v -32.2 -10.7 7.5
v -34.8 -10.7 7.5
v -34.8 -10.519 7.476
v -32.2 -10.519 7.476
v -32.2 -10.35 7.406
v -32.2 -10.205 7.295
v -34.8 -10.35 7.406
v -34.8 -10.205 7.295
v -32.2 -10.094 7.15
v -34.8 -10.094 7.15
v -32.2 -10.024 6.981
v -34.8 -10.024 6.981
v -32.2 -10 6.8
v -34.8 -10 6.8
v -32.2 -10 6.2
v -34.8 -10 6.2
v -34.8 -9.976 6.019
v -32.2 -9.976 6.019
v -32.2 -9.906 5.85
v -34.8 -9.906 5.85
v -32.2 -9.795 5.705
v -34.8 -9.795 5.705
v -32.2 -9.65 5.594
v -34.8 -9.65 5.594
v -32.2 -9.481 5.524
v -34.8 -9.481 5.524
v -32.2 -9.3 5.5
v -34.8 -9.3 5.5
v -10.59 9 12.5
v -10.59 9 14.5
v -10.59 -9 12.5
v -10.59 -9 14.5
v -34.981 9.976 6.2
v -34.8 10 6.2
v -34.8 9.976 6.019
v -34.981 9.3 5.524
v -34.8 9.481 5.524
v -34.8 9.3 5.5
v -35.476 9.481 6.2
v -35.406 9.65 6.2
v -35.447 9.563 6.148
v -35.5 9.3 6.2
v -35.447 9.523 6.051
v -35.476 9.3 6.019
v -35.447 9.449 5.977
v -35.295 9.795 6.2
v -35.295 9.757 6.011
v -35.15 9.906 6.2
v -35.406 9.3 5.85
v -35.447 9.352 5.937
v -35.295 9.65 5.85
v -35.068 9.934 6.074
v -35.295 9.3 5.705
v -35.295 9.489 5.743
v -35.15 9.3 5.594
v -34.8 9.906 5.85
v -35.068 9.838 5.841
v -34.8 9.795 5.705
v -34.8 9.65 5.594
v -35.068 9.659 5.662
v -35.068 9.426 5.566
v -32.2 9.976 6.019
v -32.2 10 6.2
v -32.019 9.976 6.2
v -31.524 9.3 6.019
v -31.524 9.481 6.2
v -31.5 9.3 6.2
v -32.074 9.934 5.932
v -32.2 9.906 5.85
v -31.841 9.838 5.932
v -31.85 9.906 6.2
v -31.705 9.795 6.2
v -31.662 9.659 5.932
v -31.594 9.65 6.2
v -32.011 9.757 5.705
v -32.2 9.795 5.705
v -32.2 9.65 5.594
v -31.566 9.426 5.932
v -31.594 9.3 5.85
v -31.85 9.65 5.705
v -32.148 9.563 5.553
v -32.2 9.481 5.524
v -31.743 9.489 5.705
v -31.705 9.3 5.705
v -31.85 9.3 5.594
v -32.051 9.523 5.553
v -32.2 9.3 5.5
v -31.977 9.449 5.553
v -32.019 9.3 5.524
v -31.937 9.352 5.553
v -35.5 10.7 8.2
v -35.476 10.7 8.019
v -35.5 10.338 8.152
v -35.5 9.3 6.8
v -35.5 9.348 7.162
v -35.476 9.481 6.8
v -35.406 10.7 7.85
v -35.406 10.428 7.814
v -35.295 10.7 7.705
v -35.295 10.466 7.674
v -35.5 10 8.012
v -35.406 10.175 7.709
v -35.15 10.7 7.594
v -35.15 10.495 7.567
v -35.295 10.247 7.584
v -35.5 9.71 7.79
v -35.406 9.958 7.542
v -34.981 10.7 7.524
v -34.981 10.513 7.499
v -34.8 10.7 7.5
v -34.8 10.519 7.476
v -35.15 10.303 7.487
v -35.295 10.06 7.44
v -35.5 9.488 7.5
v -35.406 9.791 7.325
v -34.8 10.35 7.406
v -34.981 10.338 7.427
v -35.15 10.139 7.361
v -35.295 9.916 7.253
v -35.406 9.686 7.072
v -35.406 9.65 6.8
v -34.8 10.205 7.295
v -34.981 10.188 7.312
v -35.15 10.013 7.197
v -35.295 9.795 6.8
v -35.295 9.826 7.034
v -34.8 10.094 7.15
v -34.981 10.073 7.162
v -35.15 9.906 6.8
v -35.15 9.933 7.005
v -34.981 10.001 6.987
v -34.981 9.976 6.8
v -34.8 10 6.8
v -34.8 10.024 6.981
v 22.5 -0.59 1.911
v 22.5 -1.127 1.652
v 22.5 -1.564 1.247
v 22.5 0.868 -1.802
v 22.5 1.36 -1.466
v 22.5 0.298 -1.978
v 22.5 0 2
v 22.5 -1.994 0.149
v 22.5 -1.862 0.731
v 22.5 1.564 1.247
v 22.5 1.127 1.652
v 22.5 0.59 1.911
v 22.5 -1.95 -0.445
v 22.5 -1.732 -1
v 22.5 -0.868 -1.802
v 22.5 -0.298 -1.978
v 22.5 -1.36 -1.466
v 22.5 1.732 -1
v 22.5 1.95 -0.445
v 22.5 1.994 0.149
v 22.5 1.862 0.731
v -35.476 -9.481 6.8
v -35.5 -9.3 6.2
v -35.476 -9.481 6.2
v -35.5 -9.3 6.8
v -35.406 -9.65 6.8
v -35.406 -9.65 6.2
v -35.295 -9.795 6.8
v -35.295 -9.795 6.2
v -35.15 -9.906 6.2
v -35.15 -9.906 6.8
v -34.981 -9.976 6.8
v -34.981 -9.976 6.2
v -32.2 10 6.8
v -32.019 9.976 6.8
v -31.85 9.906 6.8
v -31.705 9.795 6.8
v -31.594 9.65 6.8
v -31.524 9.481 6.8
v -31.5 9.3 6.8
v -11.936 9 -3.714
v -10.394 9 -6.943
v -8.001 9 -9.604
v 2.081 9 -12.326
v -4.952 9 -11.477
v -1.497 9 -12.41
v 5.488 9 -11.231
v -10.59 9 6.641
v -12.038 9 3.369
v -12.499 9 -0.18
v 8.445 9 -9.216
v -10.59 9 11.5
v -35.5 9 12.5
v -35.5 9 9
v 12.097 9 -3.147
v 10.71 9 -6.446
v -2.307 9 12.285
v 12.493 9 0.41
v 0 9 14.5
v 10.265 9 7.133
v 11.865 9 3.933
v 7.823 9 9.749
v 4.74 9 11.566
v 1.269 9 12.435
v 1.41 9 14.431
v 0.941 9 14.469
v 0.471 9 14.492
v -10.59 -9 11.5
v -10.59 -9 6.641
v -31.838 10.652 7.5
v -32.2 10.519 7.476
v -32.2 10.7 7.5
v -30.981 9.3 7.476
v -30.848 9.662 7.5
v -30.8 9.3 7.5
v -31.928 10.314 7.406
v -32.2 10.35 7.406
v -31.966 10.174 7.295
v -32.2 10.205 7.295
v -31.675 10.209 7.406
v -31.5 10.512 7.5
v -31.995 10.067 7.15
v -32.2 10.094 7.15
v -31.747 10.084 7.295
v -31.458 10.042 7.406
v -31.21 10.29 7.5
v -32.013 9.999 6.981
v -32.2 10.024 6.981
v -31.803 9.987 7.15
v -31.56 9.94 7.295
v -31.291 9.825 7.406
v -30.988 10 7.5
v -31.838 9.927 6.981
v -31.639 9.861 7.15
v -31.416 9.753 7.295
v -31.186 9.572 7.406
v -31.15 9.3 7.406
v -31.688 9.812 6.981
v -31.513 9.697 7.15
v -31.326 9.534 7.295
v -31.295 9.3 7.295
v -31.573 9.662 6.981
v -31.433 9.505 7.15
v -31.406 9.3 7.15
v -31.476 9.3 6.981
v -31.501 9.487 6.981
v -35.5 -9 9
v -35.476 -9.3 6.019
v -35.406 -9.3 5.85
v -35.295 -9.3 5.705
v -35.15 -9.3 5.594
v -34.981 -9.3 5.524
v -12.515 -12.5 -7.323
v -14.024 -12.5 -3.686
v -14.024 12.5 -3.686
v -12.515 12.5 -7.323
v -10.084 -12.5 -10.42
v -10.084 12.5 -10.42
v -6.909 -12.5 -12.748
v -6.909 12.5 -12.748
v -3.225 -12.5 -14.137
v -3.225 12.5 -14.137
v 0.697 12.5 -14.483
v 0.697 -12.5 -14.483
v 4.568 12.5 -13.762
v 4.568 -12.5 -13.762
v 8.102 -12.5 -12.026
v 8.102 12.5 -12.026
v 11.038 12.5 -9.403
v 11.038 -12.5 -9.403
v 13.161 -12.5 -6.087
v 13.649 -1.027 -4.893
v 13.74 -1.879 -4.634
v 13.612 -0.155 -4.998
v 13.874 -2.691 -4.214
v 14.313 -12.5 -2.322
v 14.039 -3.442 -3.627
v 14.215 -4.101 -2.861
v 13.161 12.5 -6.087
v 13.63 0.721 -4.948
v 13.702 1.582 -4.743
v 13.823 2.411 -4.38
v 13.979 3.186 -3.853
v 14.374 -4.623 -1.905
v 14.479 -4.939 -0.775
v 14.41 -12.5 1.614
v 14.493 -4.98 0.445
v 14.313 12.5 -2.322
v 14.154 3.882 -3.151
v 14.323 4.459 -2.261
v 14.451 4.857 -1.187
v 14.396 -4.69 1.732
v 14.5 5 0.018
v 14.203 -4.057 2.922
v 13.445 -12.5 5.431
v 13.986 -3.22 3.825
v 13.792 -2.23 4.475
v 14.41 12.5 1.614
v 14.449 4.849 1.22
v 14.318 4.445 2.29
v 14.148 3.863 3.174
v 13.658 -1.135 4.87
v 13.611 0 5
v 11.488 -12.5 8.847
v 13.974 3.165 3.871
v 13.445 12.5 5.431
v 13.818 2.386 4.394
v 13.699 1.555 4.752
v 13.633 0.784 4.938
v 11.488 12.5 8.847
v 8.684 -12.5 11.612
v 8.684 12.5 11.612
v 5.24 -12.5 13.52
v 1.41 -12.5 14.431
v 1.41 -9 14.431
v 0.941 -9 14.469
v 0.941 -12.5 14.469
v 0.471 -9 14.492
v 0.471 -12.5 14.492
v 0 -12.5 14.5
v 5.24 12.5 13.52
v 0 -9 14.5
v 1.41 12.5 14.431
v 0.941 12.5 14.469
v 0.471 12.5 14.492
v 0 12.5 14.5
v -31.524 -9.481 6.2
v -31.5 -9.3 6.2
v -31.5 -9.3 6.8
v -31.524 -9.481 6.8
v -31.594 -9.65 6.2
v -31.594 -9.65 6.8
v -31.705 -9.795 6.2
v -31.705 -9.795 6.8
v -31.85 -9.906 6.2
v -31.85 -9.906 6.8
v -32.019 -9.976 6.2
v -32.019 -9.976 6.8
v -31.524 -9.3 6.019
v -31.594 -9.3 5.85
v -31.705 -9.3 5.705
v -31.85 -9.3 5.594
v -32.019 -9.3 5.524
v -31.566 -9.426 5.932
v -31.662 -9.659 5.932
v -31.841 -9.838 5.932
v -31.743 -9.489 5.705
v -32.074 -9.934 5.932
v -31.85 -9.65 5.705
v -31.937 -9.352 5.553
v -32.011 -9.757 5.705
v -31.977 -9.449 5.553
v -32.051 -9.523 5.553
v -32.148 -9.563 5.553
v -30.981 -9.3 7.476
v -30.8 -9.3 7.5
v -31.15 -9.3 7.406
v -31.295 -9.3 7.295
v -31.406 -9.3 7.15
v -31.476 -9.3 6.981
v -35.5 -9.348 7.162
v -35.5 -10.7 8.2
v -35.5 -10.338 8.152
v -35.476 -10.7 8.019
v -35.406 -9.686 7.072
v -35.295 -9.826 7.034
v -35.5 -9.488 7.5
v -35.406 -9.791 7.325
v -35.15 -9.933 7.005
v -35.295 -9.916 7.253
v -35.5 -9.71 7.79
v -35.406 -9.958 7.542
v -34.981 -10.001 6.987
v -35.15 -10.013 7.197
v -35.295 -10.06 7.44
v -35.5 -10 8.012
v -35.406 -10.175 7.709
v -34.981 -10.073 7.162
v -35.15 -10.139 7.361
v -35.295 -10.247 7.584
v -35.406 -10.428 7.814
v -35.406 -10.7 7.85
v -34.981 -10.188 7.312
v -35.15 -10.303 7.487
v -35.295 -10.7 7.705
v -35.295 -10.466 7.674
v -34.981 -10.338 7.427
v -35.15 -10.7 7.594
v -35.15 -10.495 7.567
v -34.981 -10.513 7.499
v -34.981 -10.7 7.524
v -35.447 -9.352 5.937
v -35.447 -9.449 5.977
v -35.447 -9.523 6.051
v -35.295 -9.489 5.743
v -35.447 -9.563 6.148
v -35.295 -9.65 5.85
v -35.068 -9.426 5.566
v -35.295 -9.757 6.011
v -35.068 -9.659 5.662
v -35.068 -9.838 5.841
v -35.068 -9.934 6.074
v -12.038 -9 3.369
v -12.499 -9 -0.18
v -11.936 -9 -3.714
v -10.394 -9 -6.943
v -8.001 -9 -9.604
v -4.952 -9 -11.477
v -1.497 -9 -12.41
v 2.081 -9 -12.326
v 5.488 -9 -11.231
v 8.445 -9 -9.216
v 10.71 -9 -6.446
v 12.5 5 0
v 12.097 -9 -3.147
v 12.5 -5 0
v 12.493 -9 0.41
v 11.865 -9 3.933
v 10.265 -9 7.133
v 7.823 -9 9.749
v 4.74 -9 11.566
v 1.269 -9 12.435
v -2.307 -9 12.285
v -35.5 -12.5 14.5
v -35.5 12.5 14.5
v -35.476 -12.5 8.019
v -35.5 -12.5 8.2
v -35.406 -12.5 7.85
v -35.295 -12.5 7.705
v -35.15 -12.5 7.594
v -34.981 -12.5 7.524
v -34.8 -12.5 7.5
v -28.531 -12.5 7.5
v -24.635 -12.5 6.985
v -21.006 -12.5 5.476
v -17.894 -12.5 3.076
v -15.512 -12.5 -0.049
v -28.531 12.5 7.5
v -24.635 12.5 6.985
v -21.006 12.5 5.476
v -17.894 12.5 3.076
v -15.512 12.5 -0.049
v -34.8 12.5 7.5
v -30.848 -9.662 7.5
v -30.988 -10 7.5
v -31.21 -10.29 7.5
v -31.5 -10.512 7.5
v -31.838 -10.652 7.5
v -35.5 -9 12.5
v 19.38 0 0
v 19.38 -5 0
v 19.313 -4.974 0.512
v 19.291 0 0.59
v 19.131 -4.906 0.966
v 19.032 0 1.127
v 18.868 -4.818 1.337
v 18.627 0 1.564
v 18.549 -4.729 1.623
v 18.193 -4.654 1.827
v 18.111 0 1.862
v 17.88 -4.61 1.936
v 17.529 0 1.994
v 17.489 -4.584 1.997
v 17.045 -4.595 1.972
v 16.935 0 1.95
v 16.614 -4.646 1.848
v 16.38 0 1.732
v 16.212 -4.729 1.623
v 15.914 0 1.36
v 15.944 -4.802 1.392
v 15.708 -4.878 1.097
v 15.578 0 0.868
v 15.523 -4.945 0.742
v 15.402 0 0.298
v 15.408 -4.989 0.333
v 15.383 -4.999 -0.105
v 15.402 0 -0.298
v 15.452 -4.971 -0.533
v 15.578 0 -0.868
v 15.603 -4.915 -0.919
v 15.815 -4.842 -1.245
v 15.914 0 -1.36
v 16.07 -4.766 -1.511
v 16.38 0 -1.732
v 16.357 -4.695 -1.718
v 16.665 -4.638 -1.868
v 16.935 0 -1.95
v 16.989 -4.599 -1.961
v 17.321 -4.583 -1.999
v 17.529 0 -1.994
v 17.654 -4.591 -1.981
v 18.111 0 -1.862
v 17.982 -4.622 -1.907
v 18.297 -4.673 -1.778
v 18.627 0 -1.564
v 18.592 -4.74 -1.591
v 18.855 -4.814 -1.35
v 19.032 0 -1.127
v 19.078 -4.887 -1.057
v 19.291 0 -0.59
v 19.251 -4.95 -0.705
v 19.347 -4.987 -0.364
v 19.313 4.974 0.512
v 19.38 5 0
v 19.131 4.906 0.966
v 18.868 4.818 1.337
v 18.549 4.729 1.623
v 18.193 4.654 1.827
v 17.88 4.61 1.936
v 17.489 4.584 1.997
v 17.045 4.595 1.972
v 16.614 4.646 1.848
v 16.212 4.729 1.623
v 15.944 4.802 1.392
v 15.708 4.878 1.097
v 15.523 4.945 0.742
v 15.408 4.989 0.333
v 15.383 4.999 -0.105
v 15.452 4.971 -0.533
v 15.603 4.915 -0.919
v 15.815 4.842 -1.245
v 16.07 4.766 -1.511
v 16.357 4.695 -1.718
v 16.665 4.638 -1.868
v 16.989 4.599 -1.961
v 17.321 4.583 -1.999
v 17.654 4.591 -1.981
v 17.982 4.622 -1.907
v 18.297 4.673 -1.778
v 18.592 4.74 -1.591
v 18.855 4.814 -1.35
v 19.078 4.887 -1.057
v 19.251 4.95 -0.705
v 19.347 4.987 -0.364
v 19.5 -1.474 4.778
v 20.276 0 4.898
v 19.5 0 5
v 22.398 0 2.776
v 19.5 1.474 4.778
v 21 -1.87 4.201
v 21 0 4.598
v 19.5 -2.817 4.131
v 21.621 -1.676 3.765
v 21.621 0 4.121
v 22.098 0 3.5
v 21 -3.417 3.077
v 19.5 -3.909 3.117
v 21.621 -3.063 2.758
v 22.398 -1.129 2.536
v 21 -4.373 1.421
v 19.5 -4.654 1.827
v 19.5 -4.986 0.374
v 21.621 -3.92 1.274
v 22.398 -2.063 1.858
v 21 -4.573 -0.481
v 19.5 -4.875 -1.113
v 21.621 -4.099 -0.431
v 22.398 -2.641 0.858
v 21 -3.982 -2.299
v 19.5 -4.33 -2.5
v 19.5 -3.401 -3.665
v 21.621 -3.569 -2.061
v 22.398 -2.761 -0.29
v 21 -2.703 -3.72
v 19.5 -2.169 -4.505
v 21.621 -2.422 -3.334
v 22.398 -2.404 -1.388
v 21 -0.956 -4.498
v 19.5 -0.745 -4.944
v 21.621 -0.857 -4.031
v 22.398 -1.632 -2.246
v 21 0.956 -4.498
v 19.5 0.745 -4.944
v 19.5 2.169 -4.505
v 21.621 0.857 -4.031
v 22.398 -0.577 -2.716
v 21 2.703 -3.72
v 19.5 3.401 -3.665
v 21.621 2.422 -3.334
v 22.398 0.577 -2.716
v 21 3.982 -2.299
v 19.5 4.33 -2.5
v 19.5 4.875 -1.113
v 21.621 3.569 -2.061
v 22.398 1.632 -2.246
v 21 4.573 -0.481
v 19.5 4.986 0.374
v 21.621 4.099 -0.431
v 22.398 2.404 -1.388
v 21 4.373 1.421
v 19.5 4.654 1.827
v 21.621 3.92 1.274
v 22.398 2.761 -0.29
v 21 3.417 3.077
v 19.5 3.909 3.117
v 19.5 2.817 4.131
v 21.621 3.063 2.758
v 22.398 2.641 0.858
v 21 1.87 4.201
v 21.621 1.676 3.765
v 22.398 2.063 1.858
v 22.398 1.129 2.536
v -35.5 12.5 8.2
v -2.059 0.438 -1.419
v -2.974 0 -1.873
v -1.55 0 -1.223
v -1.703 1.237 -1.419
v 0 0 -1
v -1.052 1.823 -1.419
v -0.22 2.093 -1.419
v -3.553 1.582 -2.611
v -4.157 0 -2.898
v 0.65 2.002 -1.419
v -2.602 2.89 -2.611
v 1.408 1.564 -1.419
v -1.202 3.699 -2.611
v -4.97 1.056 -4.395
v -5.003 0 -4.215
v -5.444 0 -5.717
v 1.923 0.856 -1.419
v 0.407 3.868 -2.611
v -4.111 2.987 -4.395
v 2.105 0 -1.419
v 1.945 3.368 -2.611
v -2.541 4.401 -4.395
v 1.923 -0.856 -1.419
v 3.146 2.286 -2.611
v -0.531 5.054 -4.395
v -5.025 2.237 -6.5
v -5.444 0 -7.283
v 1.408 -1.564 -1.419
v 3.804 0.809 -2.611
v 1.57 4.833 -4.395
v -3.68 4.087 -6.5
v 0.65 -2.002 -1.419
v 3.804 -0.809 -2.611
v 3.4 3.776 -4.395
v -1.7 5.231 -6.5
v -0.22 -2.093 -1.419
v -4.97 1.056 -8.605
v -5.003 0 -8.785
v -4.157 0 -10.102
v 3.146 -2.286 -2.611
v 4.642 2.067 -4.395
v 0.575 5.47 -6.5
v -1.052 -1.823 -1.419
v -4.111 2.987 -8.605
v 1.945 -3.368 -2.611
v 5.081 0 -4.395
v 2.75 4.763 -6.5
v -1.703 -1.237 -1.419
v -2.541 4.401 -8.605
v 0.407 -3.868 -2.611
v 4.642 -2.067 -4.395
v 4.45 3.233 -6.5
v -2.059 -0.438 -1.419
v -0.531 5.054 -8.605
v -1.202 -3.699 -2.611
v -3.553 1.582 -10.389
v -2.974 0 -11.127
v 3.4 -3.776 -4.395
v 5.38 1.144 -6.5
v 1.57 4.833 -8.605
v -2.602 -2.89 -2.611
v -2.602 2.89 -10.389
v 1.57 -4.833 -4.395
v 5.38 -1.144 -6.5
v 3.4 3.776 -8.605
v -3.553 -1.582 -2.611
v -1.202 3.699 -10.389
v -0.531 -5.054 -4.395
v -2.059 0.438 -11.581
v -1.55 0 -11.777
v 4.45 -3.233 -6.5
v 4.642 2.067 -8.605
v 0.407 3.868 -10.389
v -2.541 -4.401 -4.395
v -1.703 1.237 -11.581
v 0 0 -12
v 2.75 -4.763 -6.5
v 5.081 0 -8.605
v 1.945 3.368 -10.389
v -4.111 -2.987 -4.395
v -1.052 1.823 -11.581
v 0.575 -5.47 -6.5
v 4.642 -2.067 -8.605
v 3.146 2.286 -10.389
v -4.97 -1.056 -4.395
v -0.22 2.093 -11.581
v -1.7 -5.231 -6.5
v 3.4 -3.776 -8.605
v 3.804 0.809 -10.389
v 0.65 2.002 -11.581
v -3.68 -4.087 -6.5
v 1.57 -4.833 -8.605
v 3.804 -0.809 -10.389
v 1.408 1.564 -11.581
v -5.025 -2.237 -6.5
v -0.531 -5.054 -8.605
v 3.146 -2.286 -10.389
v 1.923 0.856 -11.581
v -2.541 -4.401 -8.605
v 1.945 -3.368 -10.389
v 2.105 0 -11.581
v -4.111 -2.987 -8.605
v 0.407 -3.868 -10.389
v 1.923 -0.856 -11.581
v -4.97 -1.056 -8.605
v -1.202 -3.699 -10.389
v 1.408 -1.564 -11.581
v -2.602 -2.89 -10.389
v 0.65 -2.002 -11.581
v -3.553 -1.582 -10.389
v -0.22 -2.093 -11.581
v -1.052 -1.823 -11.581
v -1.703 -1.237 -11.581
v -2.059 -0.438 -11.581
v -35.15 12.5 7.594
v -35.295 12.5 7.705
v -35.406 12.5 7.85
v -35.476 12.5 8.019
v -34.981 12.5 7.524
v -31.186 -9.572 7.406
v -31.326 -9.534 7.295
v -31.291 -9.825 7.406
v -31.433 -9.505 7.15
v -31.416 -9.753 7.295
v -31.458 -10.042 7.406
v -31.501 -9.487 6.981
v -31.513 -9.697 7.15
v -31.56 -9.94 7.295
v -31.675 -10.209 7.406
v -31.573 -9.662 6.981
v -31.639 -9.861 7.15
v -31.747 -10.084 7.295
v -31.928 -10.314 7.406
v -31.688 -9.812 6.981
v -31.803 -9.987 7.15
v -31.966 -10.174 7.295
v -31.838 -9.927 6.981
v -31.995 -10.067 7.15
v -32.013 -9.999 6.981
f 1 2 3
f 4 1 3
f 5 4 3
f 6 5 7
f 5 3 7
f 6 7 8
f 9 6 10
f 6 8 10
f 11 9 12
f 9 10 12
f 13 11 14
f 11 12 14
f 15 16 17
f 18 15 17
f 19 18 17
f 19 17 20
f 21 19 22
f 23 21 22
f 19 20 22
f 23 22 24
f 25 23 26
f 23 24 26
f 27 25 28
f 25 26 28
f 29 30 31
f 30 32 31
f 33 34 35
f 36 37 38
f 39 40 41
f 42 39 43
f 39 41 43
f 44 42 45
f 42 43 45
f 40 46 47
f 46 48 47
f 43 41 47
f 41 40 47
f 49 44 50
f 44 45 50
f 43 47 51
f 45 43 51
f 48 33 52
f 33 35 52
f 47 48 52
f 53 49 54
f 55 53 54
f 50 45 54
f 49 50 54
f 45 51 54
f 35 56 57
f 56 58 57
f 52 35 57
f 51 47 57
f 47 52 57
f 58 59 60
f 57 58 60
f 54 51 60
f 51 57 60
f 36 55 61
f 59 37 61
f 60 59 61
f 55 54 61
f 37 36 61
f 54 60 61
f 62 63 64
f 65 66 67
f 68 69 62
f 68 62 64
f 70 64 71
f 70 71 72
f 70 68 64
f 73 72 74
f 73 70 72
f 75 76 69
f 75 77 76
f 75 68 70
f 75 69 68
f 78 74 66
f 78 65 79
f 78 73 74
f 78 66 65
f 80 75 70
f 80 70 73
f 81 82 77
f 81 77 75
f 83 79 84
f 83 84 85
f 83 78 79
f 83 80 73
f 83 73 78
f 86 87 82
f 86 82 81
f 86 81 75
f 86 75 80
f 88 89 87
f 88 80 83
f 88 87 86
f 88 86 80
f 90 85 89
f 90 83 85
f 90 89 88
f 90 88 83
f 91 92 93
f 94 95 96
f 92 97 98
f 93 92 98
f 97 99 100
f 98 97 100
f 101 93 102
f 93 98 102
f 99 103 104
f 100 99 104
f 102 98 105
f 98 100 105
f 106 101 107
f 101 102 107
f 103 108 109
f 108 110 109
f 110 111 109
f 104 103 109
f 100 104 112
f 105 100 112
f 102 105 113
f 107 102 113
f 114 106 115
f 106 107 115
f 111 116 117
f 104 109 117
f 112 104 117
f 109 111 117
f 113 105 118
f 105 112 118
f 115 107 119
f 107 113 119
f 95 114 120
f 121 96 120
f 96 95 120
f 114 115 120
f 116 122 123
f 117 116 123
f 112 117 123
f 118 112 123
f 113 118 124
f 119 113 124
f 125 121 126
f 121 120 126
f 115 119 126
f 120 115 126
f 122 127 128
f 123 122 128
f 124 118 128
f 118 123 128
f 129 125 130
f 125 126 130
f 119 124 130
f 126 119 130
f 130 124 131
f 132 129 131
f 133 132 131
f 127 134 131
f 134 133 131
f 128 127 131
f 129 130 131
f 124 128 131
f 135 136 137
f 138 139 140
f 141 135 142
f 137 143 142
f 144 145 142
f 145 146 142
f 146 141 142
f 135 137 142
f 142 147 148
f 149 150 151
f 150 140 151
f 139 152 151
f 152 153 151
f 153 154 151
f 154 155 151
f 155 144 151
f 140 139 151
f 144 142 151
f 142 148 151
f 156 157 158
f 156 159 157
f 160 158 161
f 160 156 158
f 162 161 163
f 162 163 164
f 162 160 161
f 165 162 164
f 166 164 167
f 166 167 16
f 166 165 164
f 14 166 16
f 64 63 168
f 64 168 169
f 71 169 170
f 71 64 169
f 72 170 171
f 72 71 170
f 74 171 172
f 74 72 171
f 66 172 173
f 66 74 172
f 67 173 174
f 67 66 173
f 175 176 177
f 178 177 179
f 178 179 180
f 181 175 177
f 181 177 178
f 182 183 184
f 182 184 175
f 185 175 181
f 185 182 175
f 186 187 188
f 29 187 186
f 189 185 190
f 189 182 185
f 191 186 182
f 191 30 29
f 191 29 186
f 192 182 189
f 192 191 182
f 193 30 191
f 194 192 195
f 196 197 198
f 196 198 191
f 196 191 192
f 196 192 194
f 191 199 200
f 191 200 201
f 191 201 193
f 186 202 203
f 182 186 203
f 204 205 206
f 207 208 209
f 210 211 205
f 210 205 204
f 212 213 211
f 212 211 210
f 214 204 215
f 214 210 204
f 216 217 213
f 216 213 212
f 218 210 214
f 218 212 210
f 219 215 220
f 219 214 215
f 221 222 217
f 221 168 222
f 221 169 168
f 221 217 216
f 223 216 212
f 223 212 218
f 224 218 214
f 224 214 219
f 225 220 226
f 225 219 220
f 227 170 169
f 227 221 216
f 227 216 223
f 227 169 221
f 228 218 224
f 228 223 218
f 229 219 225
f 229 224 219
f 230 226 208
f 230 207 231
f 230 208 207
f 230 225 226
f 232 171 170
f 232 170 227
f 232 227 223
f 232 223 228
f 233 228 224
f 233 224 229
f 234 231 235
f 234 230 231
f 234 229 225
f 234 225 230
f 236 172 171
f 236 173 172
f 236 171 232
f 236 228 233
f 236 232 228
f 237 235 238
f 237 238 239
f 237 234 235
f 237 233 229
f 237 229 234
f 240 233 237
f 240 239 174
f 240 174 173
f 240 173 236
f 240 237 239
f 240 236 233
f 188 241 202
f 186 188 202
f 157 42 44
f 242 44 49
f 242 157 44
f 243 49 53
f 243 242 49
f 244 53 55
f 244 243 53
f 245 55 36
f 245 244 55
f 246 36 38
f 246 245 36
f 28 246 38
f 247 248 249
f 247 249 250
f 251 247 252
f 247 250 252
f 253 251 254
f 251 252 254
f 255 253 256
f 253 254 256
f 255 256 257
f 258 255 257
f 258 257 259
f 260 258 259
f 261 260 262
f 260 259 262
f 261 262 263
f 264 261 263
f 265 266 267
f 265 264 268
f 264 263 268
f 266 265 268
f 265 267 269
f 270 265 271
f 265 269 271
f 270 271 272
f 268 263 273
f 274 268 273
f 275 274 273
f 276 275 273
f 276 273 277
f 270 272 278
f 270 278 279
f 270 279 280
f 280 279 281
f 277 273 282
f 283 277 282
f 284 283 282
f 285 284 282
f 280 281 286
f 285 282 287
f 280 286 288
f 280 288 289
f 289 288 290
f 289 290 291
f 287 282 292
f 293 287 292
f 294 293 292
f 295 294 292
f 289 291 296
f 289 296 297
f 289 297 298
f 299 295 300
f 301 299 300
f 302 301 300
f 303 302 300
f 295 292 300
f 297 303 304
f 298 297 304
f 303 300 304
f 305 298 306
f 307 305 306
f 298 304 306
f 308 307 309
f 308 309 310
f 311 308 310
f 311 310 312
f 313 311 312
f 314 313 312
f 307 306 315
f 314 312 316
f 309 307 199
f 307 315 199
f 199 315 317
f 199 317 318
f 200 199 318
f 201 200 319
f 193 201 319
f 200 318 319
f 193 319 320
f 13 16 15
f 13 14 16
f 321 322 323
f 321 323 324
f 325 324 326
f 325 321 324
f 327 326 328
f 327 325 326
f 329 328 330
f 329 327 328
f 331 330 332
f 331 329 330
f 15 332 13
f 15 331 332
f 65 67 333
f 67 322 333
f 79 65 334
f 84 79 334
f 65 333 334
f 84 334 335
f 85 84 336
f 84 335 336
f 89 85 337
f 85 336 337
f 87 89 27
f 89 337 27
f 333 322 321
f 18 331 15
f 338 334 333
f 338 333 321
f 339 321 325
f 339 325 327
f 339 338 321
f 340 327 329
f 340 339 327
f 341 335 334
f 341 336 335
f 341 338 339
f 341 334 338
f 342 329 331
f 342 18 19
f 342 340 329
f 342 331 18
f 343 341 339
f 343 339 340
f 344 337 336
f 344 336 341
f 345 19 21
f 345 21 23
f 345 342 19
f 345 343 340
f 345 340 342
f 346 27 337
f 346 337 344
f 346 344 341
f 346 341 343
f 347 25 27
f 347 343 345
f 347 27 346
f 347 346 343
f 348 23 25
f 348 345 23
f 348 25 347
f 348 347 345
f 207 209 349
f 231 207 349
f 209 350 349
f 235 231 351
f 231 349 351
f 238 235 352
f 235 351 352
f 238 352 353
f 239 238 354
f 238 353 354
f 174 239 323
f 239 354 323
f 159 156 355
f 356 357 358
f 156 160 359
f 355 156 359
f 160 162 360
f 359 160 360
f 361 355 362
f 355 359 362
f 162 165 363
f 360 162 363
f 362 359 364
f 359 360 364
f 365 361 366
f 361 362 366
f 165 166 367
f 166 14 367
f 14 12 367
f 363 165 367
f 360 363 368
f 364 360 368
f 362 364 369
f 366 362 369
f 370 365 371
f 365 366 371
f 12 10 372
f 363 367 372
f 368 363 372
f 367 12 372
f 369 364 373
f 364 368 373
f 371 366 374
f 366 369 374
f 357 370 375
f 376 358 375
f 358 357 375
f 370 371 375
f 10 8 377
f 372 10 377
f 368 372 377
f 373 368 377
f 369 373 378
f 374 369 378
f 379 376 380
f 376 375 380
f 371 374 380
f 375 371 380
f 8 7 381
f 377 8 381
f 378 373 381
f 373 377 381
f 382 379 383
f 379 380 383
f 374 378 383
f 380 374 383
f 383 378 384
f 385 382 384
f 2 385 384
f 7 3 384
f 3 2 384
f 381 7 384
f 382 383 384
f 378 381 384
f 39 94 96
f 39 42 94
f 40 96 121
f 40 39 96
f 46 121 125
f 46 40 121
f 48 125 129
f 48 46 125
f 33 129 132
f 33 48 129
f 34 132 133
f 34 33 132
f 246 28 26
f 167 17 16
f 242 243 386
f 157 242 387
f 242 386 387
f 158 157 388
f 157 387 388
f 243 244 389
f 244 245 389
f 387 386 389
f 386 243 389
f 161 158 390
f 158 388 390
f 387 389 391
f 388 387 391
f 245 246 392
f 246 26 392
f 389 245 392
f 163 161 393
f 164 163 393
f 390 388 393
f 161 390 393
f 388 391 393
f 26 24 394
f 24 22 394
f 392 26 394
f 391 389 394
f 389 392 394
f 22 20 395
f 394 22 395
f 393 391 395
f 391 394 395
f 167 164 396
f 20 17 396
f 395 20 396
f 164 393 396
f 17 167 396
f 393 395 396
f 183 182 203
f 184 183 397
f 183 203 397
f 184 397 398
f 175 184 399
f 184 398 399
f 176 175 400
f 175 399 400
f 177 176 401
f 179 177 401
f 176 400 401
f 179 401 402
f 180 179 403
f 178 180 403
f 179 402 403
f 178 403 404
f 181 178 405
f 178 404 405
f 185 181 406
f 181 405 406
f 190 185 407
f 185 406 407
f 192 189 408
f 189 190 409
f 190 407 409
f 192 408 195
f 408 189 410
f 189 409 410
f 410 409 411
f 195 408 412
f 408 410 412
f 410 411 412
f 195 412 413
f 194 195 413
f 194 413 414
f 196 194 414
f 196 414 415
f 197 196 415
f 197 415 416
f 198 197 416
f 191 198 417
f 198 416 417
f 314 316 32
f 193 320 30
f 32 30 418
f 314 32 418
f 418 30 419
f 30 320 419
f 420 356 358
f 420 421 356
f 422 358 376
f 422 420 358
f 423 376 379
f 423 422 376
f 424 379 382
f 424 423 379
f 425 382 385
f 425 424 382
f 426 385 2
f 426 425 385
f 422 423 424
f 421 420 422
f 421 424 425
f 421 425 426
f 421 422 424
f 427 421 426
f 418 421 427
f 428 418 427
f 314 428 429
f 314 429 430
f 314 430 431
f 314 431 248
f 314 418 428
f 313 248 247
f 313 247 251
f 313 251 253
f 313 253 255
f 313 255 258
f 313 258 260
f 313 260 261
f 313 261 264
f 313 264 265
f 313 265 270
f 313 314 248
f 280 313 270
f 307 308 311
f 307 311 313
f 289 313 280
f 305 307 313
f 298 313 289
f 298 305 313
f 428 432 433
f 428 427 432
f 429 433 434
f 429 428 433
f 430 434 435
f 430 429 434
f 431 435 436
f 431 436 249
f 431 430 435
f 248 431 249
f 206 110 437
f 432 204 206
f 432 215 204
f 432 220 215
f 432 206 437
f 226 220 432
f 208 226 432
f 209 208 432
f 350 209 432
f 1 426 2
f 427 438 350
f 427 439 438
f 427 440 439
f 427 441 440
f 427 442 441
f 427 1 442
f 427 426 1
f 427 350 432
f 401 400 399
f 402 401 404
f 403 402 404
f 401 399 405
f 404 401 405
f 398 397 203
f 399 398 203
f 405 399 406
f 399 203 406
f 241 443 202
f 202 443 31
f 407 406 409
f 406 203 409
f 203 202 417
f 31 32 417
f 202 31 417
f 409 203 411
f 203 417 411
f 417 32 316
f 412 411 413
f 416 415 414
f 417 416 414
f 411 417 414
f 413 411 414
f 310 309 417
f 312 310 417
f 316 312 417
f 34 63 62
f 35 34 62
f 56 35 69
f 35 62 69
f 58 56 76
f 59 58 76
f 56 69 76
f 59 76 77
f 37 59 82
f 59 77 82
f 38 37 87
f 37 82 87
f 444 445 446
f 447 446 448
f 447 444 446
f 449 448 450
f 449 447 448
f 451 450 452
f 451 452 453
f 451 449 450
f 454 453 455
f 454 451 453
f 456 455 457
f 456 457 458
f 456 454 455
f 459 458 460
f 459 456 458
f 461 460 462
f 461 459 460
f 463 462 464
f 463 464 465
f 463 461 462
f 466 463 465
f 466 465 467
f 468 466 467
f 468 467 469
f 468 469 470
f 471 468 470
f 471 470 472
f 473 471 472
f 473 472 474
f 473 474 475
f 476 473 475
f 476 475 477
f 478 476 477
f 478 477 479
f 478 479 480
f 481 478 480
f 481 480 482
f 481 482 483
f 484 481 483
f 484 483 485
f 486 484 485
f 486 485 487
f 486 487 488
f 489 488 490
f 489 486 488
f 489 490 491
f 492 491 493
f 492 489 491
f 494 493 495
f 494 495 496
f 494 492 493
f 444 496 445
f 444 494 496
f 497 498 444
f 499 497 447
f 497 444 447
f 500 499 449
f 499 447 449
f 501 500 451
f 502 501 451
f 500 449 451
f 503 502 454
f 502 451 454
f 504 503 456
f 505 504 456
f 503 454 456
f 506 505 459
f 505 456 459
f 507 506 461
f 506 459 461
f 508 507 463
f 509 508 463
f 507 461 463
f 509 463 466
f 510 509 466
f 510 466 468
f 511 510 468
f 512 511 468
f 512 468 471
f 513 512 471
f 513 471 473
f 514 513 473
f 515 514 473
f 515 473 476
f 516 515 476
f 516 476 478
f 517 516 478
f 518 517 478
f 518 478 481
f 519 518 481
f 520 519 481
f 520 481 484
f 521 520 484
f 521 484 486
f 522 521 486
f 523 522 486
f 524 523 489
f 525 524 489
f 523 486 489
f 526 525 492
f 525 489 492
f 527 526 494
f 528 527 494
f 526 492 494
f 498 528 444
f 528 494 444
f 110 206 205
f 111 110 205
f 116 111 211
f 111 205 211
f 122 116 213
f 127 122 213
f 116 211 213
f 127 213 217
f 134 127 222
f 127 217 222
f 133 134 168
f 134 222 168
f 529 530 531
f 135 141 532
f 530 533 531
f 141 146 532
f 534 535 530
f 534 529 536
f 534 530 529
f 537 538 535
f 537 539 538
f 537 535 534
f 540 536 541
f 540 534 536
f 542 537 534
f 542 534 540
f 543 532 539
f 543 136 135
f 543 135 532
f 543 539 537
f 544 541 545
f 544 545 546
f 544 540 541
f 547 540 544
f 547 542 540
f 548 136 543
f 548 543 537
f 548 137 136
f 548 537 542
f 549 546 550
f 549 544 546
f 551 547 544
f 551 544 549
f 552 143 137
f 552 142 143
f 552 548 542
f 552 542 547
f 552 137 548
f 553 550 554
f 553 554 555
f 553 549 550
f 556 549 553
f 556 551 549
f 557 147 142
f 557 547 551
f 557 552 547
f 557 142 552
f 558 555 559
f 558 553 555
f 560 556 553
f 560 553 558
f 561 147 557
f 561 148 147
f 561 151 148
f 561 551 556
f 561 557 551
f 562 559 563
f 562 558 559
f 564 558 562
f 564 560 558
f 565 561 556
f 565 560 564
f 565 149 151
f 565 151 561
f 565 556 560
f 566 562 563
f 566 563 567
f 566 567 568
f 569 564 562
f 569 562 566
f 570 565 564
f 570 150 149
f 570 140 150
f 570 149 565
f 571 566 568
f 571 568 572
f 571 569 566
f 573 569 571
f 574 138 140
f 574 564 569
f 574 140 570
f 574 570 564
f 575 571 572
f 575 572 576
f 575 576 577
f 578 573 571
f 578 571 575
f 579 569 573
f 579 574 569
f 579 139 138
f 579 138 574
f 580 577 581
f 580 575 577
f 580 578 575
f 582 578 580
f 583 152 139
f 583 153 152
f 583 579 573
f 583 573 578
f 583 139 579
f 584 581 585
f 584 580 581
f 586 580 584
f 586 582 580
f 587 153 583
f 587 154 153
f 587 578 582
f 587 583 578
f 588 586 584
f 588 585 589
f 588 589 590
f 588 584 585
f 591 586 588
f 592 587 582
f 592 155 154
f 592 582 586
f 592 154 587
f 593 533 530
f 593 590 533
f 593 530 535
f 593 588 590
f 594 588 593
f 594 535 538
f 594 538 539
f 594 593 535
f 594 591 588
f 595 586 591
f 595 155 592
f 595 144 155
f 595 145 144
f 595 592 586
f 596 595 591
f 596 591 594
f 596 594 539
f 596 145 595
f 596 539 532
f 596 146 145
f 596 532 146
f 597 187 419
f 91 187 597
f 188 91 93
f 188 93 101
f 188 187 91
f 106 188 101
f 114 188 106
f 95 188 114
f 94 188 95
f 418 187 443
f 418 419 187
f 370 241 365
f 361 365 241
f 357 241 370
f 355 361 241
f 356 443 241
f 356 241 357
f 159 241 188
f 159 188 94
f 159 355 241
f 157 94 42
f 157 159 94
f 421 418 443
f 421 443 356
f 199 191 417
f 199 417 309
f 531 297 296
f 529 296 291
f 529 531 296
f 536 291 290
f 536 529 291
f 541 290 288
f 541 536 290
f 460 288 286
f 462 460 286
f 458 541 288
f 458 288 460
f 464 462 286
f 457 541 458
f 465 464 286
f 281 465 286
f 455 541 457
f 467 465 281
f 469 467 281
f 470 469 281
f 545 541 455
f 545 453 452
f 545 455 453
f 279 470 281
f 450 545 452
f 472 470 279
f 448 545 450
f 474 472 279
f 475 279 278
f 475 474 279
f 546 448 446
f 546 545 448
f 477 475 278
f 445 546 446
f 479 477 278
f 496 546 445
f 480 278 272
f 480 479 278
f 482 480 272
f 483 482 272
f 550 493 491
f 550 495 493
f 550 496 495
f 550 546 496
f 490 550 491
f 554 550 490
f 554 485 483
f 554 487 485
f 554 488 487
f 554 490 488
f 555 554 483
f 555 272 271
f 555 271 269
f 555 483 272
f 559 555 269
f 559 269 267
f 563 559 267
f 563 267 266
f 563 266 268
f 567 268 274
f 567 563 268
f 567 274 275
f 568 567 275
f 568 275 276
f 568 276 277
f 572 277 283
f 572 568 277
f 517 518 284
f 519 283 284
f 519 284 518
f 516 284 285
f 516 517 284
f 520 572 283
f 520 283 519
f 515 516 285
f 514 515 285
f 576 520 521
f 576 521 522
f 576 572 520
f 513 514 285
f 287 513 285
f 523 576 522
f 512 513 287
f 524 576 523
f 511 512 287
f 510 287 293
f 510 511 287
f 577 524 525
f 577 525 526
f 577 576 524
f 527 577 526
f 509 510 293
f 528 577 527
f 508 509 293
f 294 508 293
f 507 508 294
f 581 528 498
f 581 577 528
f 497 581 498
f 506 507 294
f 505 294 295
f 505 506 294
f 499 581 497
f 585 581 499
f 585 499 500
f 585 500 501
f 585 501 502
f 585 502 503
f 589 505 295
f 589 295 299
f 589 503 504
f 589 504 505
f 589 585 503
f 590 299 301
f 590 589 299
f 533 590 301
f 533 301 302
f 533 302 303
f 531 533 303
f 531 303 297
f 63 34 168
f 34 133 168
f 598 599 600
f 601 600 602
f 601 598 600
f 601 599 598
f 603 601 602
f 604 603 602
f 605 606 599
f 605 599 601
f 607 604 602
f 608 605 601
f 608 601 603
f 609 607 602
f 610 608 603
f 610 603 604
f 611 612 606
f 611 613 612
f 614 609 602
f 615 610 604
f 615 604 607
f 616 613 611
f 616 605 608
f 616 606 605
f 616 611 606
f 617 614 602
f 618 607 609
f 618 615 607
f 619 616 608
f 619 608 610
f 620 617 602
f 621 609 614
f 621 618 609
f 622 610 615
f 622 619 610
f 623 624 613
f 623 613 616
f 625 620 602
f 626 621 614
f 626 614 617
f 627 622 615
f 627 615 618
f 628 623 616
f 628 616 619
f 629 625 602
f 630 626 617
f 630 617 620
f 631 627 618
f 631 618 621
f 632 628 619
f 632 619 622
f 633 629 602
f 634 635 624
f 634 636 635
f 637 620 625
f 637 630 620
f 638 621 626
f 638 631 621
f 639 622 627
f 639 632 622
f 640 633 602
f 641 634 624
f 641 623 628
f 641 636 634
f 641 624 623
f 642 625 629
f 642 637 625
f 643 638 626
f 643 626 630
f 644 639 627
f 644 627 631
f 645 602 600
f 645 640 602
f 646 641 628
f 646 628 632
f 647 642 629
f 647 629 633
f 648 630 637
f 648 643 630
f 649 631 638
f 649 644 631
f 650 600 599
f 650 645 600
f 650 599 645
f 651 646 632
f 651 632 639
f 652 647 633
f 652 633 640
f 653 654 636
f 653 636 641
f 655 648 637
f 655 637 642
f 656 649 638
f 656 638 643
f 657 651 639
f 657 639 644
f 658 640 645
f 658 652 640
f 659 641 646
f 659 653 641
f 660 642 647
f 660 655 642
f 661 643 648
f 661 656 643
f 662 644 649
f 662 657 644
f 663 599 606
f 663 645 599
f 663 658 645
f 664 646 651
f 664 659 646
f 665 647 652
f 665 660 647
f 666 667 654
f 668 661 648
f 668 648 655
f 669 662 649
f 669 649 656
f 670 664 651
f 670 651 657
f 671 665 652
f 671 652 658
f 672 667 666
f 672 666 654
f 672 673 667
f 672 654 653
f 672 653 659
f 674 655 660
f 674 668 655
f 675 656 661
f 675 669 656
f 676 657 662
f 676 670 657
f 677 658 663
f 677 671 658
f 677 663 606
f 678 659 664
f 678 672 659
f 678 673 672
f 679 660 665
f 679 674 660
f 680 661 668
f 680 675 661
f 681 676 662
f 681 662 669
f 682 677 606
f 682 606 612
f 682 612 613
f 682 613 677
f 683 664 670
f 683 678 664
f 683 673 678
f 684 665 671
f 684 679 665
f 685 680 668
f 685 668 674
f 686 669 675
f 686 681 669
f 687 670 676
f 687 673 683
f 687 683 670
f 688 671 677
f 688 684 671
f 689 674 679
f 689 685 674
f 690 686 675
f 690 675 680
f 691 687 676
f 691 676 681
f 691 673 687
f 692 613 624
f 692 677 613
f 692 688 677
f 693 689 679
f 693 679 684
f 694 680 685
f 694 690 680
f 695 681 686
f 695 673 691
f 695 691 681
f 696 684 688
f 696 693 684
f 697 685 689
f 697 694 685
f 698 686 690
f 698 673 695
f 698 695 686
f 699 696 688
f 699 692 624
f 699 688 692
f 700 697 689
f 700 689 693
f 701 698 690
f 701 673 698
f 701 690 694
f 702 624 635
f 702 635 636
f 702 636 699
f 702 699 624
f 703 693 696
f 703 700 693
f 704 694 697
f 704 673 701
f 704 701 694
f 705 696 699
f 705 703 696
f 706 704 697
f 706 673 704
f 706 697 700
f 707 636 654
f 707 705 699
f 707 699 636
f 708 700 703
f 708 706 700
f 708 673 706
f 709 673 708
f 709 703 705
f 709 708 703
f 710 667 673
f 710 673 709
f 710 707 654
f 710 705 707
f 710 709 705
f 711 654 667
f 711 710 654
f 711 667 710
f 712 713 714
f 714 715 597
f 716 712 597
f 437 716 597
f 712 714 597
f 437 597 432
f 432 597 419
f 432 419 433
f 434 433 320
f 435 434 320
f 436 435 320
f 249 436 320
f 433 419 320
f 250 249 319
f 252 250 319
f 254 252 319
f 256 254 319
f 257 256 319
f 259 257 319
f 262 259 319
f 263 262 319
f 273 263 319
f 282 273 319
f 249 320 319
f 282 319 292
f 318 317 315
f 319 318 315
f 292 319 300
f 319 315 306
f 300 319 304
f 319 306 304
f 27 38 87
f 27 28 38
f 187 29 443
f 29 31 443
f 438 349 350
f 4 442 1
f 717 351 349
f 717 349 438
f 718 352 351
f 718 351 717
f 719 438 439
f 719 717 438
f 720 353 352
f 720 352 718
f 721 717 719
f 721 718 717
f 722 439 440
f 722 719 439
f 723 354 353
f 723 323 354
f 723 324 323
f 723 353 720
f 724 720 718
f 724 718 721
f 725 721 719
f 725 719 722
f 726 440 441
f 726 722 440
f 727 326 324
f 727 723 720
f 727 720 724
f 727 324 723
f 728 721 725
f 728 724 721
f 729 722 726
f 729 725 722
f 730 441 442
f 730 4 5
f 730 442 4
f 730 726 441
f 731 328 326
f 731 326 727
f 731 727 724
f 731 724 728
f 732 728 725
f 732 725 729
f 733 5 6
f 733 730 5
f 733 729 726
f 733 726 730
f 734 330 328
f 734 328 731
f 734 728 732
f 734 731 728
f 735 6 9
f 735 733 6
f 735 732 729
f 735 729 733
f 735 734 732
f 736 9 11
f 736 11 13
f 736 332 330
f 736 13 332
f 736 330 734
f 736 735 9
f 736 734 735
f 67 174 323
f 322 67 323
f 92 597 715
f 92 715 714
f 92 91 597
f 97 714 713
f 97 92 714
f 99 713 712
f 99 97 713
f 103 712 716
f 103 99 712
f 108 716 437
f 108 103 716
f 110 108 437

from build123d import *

# Parameters (mm, degrees)
F0_W          = 24.9102279718
F0_H          = 2
F1_DEPTH      = 12.5
F2_DEPTH      = 9
F5_W          = 10
F5_H          = 5
F7_R          = 3
F8_R          = 2
F9_DEPTH      = 12.5010001
F9_DEPTH_BACK = 12.5010001
F10_W         = 4
F10_H         = 20
F11_DEPTH     = 2
F12_F1_R      = 0.7
F12_F2_R      = 0.7
F12_F3_R      = 0.7
F12_F4_R      = 0.7
F12_F5_R      = 0.7
F13_R         = 15


with BuildPart() as f1:
    # F0 (on Front) → F1 (new body, symmetric)
    with BuildSketch(Plane.XZ):
        with BuildLine():
            Line((-10.5897720282, 11.5), (-35.5, 9))
            Line((-35.5, 9), (-35.5, 7.5))
            Line((-35.5, 7.5), (-12.409673646, 7.5))
            ThreePointArc((-12.409673646, 7.5), (6.5005800977, -12.9611904698), (1.4102279718, 14.4312597187))
            Line((1.4102279718, 14.4312597187), (-2.3066189308, 12.2853371589))
            ThreePointArc((-2.3066189308, 12.2853371589), (7.0386819061, -10.3299059543), (-10.5897720282, 6.6412896632))
            Line((-10.5897720282, 6.6412896632), (-10.5897720282, 11.5))
        make_face()
        with Locations((-23.0448860141, 13.5)):
            Rectangle(F0_W, F0_H)
        with BuildLine():
            Line((-35.5, 12.5), (-35.5, 9))
            Line((-35.5, 9), (-10.5897720282, 11.5))
            Line((-10.5897720282, 11.5), (-10.5897720282, 6.6412896632))
            ThreePointArc((-10.5897720282, 6.6412896632), (7.0386819061, -10.3299059543), (-2.3066189308, 12.2853371589))
            Line((-2.3066189308, 12.2853371589), (1.4102279718, 14.4312597187))
            ThreePointArc((1.4102279718, 14.4312597187), (0.7059511596, 14.4828047339), (0, 14.5))
            Line((0, 14.5), (-10.5897720282, 14.5))
            Line((-10.5897720282, 14.5), (-10.5897720282, 12.5))
            Line((-10.5897720282, 12.5), (-35.5, 12.5))
        make_face()
    extrude(amount=F1_DEPTH, both=True)

    # F0 (on Front) → F2 (cut, symmetric)
    with BuildSketch(Plane.XZ):
        with BuildLine():
            Line((-35.5, 12.5), (-35.5, 9))
            Line((-35.5, 9), (-10.5897720282, 11.5))
            Line((-10.5897720282, 11.5), (-10.5897720282, 6.6412896632))
            ThreePointArc((-10.5897720282, 6.6412896632), (7.0386819061, -10.3299059543), (-2.3066189308, 12.2853371589))
            Line((-2.3066189308, 12.2853371589), (1.4102279718, 14.4312597187))
            ThreePointArc((1.4102279718, 14.4312597187), (0.7059511596, 14.4828047339), (0, 14.5))
            Line((0, 14.5), (-10.5897720282, 14.5))
            Line((-10.5897720282, 14.5), (-10.5897720282, 12.5))
            Line((-10.5897720282, 12.5), (-35.5, 12.5))
        make_face()
    extrude(amount=F2_DEPTH, both=True, mode=Mode.SUBTRACT)

    # F5 (on Front) → F6 (revolve)
    with BuildSketch(Plane.XZ):
        with Locations((17.5, 2.5)):
            Rectangle(F5_W, F5_H)
    revolve(axis=Axis((17.5, 0, 0), (1, 0, 0)))

    # F7
    f7_edges = [f1.edges().sort_by_distance(p)[0] for p in [
        (22.5, 0, -5),
    ]]
    fillet(f7_edges, radius=F7_R)

    # F8 (on Front) → F9 (cut, two sides)
    with BuildSketch(Plane.XZ) as f9_sk:
        with Locations((17.38, 0)):
            Circle(F8_R)
    extrude(amount=F9_DEPTH, mode=Mode.SUBTRACT)
    extrude(f9_sk.sketch, amount=-F9_DEPTH_BACK, mode=Mode.SUBTRACT)

    # F10 (on face) → F11 (join)
    with BuildSketch(Plane(origin=(0, 0, 7.5), x_dir=(1, 0, 0), z_dir=(0, 0, -1))):
        with Locations((-33.5, 0)):
            Rectangle(F10_W, F10_H)
    extrude(amount=F11_DEPTH)

    # F12: fillet of radius 0.7 on 11 edges, made by hand

    # F12_f1
    f12_f1_edges = [f1.edges().sort_by_distance(p)[0] for p in [
        (-31.5, 10, 6.5),
    ]]
    fillet(f12_f1_edges, radius=F12_F1_R)

    # F12_f2
    f12_f2_edges = [f1.edges().sort_by_distance(p)[0] for p in [
        (-31.5, -10, 6.5),
    ]]
    fillet(f12_f2_edges, radius=F12_F2_R)

    # F12_f3
    f12_f3_edges = [f1.edges().sort_by_distance(p)[0] for p in [
        (-33.85, 10, 7.5),
    ]]
    fillet(f12_f3_edges, radius=F12_F3_R)

    # F12_f4
    f12_f4_edges = [f1.edges().sort_by_distance(p)[0] for p in [
        (-33.85, 10, 5.5),
    ]]
    fillet(f12_f4_edges, radius=F12_F4_R)

    # F12_f5
    f12_f5_edges = [f1.edges().sort_by_distance(p)[0] for p in [
        (-35.5, 0, 5.5),
    ]]
    fillet(f12_f5_edges, radius=F12_F5_R)

    # F13
    f13_edges = [f1.edges().sort_by_distance(p)[0] for p in [
        (-12.409674, 0, 7.5),
    ]]
    fillet(f13_edges, radius=F13_R)


with BuildPart() as f4:
    # F3 (on Front) → F4 (revolve)
    with BuildSketch(Plane.XZ):
        with BuildLine():
            Line((0, -12), (0, -1))
            ThreePointArc((0, -1), (-5.5, -6.5), (0, -12))
        make_face()
    revolve(axis=Axis((0, 0, -6.5), (0, 0, -1)))


solid = Compound([f1.part, f4.part])
